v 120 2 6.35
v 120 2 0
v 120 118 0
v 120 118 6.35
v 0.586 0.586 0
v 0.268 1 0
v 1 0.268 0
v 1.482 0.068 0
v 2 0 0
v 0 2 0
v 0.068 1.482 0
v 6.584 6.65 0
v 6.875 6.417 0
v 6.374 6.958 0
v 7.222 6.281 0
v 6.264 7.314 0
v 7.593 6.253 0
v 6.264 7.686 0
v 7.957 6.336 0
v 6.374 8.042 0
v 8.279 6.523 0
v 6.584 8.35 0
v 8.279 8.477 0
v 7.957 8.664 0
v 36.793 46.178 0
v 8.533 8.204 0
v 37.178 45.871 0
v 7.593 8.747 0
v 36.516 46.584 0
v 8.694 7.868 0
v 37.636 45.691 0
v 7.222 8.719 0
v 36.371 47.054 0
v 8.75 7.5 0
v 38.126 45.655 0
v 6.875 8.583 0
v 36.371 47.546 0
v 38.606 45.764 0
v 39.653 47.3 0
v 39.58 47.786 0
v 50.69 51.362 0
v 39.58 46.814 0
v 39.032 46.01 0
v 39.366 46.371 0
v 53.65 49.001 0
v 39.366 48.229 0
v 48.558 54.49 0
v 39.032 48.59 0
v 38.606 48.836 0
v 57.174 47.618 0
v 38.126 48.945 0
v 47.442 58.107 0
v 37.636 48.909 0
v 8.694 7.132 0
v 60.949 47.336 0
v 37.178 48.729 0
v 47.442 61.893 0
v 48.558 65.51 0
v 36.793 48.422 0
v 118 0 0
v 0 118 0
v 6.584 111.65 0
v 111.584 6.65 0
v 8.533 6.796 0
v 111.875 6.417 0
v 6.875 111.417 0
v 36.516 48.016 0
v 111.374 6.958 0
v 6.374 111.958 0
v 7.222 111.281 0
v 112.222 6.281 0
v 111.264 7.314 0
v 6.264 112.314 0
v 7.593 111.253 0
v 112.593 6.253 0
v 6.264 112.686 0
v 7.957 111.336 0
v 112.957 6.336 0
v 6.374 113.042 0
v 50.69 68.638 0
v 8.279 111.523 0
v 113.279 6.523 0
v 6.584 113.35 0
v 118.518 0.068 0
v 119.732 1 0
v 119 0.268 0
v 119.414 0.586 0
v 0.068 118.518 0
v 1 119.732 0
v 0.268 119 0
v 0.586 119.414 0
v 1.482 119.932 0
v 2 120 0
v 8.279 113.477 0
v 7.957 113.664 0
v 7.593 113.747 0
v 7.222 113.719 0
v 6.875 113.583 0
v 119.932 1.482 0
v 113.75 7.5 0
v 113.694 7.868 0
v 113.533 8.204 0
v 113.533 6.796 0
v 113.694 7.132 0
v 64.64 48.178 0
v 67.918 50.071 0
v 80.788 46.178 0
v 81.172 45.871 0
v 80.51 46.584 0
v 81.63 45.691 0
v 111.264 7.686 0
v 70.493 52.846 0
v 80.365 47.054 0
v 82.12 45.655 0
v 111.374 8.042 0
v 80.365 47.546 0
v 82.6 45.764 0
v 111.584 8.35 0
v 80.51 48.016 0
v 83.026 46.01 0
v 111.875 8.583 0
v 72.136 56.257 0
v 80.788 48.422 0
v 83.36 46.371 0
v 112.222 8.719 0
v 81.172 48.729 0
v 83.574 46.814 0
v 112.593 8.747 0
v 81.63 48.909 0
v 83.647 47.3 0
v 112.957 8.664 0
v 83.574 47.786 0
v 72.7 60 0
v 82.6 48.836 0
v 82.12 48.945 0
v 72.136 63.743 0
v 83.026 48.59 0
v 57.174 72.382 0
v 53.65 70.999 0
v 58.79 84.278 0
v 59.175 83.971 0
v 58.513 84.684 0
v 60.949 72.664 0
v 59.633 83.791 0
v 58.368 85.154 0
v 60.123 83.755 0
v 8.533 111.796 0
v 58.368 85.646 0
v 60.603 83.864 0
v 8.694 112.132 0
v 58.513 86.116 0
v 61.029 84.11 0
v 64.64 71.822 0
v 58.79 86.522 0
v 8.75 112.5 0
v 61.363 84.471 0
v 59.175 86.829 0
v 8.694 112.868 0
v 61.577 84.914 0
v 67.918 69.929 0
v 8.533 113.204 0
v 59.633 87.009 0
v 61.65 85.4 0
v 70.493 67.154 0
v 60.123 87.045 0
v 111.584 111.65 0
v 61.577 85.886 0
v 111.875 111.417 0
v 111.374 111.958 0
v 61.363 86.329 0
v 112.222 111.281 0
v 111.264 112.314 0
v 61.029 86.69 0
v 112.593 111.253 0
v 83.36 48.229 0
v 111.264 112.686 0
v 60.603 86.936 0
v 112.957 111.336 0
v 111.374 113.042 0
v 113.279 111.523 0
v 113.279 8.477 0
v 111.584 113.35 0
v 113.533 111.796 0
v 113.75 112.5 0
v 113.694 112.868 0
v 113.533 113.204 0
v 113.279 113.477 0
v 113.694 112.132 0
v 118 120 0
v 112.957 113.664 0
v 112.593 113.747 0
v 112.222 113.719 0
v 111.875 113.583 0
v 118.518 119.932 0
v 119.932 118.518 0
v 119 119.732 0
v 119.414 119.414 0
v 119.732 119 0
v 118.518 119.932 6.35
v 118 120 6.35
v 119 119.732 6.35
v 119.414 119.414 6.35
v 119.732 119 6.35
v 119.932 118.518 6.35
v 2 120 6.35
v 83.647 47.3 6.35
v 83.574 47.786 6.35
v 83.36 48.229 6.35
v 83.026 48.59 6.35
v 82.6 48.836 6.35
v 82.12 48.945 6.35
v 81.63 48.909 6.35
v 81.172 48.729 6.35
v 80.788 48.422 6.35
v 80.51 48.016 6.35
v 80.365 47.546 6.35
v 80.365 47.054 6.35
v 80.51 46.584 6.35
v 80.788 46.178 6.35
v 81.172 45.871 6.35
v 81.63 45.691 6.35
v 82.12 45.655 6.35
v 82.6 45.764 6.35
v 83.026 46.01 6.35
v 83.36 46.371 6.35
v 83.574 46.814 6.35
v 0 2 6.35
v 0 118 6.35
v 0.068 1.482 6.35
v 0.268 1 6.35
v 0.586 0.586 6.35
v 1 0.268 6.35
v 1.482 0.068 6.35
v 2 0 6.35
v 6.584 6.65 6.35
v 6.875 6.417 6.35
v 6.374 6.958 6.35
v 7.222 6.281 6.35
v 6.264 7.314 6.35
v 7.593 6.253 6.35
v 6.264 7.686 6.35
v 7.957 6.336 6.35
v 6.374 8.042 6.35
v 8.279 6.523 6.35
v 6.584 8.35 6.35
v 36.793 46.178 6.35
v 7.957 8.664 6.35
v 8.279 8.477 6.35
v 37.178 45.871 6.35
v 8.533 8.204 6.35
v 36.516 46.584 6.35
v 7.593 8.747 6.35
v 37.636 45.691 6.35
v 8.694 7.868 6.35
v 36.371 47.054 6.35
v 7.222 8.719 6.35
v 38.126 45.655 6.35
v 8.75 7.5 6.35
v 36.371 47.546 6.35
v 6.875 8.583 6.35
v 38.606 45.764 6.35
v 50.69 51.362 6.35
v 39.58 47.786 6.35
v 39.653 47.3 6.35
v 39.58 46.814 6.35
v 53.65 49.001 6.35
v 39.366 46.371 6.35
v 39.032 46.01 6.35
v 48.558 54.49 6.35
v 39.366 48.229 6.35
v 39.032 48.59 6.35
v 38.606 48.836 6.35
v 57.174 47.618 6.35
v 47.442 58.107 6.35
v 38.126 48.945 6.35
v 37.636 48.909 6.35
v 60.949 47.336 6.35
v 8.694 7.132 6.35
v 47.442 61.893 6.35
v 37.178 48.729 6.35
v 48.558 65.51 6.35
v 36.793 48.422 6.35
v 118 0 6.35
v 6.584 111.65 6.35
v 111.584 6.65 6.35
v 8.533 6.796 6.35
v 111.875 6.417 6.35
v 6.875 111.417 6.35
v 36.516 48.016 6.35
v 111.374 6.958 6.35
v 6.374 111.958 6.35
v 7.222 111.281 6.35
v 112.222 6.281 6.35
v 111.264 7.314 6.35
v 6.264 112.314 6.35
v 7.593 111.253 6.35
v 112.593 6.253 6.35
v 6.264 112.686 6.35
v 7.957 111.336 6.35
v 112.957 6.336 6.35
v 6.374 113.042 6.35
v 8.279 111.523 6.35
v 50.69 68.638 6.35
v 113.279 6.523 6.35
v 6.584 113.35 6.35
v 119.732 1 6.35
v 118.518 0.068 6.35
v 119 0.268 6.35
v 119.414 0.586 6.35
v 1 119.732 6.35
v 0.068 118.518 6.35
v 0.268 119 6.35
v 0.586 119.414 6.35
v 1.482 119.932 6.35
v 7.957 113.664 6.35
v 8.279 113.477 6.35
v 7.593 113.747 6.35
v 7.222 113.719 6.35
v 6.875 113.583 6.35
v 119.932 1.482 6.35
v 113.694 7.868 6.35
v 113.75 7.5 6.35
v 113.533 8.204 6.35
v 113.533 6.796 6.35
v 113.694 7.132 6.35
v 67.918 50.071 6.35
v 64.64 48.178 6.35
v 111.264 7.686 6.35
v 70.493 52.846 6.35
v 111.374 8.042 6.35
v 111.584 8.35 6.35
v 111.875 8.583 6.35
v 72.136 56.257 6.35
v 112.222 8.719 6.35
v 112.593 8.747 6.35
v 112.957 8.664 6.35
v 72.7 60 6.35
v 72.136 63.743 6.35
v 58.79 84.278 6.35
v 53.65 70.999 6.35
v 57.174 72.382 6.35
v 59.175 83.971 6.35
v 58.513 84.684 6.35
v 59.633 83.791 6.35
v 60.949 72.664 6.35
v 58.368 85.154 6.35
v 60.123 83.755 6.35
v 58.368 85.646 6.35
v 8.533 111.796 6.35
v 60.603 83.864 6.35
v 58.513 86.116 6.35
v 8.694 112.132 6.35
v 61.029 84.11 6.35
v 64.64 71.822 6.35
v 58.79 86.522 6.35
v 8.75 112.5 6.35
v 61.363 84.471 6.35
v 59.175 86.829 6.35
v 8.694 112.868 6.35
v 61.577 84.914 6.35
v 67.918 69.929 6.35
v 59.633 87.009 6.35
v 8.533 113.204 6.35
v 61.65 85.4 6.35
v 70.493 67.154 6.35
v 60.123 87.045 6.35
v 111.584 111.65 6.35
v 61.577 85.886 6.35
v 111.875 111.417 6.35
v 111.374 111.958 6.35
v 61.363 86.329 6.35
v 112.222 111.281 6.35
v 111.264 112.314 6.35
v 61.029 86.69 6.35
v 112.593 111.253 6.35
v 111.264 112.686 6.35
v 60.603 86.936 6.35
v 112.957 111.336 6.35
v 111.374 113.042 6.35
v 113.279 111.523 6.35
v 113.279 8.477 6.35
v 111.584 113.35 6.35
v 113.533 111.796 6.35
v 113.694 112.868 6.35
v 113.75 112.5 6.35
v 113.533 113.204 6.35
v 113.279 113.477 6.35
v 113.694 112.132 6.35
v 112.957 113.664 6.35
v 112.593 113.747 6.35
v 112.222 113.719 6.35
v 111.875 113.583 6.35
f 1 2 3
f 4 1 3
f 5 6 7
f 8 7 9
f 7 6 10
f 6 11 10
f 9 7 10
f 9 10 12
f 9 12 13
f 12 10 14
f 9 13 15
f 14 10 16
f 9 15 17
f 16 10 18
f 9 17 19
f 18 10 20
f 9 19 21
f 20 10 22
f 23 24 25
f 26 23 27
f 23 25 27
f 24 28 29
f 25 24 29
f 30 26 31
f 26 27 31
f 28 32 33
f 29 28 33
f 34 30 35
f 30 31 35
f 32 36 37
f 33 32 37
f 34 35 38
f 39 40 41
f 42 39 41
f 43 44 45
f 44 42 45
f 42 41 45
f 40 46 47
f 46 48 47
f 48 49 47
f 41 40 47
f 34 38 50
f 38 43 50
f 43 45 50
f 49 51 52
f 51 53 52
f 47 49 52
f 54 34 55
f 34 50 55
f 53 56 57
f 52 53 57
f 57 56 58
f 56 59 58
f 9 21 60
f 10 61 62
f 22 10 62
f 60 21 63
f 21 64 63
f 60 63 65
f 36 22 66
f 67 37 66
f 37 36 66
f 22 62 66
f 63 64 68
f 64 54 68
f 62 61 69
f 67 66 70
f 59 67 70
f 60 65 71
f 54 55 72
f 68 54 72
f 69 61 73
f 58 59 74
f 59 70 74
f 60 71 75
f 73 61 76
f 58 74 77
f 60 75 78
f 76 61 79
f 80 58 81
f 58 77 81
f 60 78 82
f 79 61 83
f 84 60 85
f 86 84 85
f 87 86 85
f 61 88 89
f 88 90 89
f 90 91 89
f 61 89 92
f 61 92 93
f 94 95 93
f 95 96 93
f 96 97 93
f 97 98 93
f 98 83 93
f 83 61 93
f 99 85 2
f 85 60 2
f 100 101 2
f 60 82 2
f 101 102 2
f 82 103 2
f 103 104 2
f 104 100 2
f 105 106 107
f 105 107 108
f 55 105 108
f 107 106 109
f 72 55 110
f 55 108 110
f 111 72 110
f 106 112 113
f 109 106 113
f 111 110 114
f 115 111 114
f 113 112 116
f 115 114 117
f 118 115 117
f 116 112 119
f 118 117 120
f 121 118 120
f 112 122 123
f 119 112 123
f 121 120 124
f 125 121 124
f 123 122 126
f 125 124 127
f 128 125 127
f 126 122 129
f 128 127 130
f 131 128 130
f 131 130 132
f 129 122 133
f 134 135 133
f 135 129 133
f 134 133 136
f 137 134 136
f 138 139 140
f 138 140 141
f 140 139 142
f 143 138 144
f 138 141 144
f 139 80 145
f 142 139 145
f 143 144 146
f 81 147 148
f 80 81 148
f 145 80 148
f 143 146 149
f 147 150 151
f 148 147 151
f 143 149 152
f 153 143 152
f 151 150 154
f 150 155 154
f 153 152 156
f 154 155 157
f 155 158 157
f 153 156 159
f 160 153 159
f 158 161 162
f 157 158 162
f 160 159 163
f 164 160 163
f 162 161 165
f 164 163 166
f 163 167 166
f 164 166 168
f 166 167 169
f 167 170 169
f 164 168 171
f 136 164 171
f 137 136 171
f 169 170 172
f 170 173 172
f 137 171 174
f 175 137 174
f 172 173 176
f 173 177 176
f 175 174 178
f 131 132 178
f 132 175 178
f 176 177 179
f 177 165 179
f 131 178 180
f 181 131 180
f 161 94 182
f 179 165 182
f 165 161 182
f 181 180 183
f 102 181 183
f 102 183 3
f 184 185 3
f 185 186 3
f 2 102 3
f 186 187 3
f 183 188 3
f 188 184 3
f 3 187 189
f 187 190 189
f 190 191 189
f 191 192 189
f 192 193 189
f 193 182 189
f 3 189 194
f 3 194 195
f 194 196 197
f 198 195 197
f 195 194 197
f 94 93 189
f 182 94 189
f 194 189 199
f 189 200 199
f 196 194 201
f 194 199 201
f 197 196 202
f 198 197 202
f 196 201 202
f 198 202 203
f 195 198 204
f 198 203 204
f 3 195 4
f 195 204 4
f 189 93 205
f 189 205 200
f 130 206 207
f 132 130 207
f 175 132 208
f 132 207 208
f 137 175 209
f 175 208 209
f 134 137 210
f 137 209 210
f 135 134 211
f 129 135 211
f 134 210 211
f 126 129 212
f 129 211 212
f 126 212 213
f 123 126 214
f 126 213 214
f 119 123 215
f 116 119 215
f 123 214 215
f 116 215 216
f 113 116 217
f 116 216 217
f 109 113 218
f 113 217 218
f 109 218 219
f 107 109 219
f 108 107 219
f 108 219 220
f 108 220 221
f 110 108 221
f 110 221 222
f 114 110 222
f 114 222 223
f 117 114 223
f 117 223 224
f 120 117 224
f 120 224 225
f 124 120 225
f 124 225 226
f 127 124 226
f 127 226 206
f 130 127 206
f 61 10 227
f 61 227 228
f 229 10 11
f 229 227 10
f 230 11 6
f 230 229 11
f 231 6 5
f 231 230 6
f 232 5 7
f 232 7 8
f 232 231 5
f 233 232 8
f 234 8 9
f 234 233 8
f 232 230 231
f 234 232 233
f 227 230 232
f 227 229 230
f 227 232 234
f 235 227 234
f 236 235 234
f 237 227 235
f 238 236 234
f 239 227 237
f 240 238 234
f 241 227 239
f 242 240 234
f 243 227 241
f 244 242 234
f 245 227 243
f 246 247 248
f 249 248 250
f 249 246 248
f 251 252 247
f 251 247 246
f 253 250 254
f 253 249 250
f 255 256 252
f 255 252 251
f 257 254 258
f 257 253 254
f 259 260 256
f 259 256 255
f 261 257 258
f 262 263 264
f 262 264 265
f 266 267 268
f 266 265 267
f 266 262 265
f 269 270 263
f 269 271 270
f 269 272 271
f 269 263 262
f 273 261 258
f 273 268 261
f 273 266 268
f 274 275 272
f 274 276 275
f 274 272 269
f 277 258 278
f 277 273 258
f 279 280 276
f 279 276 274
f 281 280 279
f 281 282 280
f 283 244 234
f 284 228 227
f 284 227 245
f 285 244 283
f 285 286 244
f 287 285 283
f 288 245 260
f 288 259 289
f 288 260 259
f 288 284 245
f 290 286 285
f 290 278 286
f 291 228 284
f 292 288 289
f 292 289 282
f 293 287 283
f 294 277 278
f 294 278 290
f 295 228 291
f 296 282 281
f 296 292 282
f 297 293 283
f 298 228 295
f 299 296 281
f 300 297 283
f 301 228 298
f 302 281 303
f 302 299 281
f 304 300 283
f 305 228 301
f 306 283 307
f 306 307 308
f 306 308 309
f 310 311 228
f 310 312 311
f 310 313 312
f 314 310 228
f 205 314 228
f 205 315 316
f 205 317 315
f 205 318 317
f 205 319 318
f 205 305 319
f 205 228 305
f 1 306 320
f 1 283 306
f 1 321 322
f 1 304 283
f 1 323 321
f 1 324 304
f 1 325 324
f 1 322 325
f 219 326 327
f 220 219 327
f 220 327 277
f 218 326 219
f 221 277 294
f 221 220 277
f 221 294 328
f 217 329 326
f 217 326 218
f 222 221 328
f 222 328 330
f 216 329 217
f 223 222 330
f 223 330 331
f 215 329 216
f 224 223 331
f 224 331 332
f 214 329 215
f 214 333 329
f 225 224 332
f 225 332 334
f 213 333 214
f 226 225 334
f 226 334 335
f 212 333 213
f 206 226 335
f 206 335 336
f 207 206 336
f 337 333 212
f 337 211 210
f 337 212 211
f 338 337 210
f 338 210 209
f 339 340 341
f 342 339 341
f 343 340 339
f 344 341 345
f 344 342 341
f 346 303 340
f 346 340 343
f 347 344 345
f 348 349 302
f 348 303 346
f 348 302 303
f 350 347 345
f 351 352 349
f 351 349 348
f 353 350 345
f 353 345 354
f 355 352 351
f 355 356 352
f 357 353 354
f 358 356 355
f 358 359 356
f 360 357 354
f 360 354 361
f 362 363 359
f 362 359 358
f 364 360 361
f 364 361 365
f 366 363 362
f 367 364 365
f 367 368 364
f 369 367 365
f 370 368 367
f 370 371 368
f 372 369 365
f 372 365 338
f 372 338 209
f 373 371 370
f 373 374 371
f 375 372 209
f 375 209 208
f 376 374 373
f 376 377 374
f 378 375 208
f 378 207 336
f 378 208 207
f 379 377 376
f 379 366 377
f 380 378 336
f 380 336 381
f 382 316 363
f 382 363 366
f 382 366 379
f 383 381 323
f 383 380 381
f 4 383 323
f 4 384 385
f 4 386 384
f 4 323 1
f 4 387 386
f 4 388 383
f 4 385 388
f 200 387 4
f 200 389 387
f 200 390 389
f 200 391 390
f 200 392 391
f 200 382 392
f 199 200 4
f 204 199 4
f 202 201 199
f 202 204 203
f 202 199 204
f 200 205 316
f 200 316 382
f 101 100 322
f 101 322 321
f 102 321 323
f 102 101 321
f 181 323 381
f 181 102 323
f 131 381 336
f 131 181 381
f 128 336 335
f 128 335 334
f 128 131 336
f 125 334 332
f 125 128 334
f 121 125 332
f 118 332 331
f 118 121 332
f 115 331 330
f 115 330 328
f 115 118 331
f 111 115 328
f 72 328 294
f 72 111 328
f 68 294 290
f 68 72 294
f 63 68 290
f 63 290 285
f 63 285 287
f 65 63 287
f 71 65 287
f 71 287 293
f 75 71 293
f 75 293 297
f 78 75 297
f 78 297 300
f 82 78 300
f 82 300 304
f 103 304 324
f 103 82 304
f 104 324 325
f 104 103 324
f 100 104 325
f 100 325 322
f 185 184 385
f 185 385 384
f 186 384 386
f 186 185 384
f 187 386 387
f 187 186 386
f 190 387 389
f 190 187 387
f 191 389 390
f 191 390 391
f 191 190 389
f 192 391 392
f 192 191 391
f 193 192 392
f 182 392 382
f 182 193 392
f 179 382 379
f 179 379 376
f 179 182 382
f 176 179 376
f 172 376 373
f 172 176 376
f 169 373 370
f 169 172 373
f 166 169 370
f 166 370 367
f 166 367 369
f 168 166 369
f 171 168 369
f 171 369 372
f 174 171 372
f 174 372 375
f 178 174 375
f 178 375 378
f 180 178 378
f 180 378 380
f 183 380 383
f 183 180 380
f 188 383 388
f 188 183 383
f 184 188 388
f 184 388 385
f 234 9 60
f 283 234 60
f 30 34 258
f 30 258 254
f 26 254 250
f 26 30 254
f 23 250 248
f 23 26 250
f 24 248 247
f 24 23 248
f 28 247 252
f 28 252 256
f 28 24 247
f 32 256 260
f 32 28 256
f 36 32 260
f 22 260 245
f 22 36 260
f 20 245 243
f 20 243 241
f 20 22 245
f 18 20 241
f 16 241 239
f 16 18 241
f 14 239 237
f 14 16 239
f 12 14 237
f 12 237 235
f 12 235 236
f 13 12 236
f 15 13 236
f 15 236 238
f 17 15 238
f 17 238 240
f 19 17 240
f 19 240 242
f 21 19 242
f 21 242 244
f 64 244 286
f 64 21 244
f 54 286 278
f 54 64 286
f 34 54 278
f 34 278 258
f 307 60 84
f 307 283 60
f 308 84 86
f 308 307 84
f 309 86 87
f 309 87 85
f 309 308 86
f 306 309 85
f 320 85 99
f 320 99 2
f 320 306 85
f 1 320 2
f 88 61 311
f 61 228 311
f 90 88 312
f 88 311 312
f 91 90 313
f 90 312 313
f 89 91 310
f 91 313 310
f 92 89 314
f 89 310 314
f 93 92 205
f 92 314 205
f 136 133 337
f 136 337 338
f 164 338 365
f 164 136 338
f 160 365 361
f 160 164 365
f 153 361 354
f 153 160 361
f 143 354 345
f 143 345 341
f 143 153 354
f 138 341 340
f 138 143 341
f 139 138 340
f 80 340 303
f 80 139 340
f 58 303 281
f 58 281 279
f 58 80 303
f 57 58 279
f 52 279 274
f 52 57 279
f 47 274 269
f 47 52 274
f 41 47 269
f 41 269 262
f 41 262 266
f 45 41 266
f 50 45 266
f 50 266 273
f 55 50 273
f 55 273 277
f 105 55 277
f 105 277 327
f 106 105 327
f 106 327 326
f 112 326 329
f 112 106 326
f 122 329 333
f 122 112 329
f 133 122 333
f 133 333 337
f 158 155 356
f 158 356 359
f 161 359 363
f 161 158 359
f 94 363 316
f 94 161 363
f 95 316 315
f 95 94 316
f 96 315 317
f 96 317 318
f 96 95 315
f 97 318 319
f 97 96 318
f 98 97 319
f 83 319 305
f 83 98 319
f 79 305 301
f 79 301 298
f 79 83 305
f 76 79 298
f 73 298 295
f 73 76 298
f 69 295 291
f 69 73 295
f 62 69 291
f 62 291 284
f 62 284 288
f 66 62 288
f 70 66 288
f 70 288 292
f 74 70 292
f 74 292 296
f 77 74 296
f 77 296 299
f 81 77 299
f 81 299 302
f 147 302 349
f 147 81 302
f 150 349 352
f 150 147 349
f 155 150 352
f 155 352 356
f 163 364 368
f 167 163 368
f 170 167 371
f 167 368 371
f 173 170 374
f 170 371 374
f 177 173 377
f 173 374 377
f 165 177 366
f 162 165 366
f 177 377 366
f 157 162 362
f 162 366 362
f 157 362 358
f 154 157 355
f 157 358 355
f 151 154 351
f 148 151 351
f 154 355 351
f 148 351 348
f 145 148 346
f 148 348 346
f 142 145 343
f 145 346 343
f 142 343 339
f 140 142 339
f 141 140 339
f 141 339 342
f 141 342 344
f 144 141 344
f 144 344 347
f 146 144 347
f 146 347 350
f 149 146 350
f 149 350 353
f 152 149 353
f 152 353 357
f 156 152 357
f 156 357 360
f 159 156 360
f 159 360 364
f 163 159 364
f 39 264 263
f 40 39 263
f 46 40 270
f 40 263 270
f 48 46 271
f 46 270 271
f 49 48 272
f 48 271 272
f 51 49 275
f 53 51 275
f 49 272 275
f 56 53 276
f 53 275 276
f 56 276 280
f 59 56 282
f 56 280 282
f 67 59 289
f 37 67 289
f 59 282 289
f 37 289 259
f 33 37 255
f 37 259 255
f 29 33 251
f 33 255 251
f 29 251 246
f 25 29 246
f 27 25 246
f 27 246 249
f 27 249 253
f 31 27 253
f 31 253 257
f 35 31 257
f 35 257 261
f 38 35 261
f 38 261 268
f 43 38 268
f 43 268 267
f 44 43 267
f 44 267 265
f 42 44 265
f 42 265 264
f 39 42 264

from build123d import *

# Parameters (mm, degrees)
ESQUISSE1_W             = 120
ESQUISSE1_H             = 120
ESQUISSE1_R             = 1.25
ESQUISSE1_R_2           = 12.7
BOSS_EXTRU_1_DEPTH      = 6.35
CONG_1_R                = 2
ESQUISSE2_R             = 1.65
ENL_V_MAT_EXTRU_1_DEPTH = 7.35


with BuildPart() as part:
    # Esquisse1 → Boss.-Extru.1 (new body)
    with BuildSketch(Plane.XY):
        with Locations((60, 60)):
            Rectangle(ESQUISSE1_W, ESQUISSE1_H)
        with Locations((7.5, 112.5)):
            Circle(ESQUISSE1_R, mode=Mode.SUBTRACT)
        with Locations((112.5, 112.5)):
            Circle(ESQUISSE1_R, mode=Mode.SUBTRACT)
        with Locations((112.5, 7.5)):
            Circle(ESQUISSE1_R, mode=Mode.SUBTRACT)
        with Locations((7.5, 7.5)):
            Circle(ESQUISSE1_R, mode=Mode.SUBTRACT)
        with Locations((60, 60)):
            Circle(ESQUISSE1_R_2, mode=Mode.SUBTRACT)
    extrude(amount=BOSS_EXTRU_1_DEPTH)

    # Congé1
    cong_1_edges = [part.edges().sort_by_distance(p)[0] for p in [
        (0, 120, 3.175),
        (120, 120, 3.175),
        (120, 0, 3.175),
        (0, 0, 3.175),
    ]]
    fillet(cong_1_edges, radius=CONG_1_R)

    # Esquisse2 → Enlèv. mat.-Extru.1 (cut, through all)
    with BuildSketch(Plane.XY.offset(6.35)):
        with Locations((60, 85.4)):
            Circle(ESQUISSE2_R)
        with Locations((38.002954744, 47.3)):
            Circle(ESQUISSE2_R)
        with Locations((81.997045256, 47.3)):
            Circle(ESQUISSE2_R)
    extrude(amount=-ENL_V_MAT_EXTRU_1_DEPTH, mode=Mode.SUBTRACT)


solid = part.part
